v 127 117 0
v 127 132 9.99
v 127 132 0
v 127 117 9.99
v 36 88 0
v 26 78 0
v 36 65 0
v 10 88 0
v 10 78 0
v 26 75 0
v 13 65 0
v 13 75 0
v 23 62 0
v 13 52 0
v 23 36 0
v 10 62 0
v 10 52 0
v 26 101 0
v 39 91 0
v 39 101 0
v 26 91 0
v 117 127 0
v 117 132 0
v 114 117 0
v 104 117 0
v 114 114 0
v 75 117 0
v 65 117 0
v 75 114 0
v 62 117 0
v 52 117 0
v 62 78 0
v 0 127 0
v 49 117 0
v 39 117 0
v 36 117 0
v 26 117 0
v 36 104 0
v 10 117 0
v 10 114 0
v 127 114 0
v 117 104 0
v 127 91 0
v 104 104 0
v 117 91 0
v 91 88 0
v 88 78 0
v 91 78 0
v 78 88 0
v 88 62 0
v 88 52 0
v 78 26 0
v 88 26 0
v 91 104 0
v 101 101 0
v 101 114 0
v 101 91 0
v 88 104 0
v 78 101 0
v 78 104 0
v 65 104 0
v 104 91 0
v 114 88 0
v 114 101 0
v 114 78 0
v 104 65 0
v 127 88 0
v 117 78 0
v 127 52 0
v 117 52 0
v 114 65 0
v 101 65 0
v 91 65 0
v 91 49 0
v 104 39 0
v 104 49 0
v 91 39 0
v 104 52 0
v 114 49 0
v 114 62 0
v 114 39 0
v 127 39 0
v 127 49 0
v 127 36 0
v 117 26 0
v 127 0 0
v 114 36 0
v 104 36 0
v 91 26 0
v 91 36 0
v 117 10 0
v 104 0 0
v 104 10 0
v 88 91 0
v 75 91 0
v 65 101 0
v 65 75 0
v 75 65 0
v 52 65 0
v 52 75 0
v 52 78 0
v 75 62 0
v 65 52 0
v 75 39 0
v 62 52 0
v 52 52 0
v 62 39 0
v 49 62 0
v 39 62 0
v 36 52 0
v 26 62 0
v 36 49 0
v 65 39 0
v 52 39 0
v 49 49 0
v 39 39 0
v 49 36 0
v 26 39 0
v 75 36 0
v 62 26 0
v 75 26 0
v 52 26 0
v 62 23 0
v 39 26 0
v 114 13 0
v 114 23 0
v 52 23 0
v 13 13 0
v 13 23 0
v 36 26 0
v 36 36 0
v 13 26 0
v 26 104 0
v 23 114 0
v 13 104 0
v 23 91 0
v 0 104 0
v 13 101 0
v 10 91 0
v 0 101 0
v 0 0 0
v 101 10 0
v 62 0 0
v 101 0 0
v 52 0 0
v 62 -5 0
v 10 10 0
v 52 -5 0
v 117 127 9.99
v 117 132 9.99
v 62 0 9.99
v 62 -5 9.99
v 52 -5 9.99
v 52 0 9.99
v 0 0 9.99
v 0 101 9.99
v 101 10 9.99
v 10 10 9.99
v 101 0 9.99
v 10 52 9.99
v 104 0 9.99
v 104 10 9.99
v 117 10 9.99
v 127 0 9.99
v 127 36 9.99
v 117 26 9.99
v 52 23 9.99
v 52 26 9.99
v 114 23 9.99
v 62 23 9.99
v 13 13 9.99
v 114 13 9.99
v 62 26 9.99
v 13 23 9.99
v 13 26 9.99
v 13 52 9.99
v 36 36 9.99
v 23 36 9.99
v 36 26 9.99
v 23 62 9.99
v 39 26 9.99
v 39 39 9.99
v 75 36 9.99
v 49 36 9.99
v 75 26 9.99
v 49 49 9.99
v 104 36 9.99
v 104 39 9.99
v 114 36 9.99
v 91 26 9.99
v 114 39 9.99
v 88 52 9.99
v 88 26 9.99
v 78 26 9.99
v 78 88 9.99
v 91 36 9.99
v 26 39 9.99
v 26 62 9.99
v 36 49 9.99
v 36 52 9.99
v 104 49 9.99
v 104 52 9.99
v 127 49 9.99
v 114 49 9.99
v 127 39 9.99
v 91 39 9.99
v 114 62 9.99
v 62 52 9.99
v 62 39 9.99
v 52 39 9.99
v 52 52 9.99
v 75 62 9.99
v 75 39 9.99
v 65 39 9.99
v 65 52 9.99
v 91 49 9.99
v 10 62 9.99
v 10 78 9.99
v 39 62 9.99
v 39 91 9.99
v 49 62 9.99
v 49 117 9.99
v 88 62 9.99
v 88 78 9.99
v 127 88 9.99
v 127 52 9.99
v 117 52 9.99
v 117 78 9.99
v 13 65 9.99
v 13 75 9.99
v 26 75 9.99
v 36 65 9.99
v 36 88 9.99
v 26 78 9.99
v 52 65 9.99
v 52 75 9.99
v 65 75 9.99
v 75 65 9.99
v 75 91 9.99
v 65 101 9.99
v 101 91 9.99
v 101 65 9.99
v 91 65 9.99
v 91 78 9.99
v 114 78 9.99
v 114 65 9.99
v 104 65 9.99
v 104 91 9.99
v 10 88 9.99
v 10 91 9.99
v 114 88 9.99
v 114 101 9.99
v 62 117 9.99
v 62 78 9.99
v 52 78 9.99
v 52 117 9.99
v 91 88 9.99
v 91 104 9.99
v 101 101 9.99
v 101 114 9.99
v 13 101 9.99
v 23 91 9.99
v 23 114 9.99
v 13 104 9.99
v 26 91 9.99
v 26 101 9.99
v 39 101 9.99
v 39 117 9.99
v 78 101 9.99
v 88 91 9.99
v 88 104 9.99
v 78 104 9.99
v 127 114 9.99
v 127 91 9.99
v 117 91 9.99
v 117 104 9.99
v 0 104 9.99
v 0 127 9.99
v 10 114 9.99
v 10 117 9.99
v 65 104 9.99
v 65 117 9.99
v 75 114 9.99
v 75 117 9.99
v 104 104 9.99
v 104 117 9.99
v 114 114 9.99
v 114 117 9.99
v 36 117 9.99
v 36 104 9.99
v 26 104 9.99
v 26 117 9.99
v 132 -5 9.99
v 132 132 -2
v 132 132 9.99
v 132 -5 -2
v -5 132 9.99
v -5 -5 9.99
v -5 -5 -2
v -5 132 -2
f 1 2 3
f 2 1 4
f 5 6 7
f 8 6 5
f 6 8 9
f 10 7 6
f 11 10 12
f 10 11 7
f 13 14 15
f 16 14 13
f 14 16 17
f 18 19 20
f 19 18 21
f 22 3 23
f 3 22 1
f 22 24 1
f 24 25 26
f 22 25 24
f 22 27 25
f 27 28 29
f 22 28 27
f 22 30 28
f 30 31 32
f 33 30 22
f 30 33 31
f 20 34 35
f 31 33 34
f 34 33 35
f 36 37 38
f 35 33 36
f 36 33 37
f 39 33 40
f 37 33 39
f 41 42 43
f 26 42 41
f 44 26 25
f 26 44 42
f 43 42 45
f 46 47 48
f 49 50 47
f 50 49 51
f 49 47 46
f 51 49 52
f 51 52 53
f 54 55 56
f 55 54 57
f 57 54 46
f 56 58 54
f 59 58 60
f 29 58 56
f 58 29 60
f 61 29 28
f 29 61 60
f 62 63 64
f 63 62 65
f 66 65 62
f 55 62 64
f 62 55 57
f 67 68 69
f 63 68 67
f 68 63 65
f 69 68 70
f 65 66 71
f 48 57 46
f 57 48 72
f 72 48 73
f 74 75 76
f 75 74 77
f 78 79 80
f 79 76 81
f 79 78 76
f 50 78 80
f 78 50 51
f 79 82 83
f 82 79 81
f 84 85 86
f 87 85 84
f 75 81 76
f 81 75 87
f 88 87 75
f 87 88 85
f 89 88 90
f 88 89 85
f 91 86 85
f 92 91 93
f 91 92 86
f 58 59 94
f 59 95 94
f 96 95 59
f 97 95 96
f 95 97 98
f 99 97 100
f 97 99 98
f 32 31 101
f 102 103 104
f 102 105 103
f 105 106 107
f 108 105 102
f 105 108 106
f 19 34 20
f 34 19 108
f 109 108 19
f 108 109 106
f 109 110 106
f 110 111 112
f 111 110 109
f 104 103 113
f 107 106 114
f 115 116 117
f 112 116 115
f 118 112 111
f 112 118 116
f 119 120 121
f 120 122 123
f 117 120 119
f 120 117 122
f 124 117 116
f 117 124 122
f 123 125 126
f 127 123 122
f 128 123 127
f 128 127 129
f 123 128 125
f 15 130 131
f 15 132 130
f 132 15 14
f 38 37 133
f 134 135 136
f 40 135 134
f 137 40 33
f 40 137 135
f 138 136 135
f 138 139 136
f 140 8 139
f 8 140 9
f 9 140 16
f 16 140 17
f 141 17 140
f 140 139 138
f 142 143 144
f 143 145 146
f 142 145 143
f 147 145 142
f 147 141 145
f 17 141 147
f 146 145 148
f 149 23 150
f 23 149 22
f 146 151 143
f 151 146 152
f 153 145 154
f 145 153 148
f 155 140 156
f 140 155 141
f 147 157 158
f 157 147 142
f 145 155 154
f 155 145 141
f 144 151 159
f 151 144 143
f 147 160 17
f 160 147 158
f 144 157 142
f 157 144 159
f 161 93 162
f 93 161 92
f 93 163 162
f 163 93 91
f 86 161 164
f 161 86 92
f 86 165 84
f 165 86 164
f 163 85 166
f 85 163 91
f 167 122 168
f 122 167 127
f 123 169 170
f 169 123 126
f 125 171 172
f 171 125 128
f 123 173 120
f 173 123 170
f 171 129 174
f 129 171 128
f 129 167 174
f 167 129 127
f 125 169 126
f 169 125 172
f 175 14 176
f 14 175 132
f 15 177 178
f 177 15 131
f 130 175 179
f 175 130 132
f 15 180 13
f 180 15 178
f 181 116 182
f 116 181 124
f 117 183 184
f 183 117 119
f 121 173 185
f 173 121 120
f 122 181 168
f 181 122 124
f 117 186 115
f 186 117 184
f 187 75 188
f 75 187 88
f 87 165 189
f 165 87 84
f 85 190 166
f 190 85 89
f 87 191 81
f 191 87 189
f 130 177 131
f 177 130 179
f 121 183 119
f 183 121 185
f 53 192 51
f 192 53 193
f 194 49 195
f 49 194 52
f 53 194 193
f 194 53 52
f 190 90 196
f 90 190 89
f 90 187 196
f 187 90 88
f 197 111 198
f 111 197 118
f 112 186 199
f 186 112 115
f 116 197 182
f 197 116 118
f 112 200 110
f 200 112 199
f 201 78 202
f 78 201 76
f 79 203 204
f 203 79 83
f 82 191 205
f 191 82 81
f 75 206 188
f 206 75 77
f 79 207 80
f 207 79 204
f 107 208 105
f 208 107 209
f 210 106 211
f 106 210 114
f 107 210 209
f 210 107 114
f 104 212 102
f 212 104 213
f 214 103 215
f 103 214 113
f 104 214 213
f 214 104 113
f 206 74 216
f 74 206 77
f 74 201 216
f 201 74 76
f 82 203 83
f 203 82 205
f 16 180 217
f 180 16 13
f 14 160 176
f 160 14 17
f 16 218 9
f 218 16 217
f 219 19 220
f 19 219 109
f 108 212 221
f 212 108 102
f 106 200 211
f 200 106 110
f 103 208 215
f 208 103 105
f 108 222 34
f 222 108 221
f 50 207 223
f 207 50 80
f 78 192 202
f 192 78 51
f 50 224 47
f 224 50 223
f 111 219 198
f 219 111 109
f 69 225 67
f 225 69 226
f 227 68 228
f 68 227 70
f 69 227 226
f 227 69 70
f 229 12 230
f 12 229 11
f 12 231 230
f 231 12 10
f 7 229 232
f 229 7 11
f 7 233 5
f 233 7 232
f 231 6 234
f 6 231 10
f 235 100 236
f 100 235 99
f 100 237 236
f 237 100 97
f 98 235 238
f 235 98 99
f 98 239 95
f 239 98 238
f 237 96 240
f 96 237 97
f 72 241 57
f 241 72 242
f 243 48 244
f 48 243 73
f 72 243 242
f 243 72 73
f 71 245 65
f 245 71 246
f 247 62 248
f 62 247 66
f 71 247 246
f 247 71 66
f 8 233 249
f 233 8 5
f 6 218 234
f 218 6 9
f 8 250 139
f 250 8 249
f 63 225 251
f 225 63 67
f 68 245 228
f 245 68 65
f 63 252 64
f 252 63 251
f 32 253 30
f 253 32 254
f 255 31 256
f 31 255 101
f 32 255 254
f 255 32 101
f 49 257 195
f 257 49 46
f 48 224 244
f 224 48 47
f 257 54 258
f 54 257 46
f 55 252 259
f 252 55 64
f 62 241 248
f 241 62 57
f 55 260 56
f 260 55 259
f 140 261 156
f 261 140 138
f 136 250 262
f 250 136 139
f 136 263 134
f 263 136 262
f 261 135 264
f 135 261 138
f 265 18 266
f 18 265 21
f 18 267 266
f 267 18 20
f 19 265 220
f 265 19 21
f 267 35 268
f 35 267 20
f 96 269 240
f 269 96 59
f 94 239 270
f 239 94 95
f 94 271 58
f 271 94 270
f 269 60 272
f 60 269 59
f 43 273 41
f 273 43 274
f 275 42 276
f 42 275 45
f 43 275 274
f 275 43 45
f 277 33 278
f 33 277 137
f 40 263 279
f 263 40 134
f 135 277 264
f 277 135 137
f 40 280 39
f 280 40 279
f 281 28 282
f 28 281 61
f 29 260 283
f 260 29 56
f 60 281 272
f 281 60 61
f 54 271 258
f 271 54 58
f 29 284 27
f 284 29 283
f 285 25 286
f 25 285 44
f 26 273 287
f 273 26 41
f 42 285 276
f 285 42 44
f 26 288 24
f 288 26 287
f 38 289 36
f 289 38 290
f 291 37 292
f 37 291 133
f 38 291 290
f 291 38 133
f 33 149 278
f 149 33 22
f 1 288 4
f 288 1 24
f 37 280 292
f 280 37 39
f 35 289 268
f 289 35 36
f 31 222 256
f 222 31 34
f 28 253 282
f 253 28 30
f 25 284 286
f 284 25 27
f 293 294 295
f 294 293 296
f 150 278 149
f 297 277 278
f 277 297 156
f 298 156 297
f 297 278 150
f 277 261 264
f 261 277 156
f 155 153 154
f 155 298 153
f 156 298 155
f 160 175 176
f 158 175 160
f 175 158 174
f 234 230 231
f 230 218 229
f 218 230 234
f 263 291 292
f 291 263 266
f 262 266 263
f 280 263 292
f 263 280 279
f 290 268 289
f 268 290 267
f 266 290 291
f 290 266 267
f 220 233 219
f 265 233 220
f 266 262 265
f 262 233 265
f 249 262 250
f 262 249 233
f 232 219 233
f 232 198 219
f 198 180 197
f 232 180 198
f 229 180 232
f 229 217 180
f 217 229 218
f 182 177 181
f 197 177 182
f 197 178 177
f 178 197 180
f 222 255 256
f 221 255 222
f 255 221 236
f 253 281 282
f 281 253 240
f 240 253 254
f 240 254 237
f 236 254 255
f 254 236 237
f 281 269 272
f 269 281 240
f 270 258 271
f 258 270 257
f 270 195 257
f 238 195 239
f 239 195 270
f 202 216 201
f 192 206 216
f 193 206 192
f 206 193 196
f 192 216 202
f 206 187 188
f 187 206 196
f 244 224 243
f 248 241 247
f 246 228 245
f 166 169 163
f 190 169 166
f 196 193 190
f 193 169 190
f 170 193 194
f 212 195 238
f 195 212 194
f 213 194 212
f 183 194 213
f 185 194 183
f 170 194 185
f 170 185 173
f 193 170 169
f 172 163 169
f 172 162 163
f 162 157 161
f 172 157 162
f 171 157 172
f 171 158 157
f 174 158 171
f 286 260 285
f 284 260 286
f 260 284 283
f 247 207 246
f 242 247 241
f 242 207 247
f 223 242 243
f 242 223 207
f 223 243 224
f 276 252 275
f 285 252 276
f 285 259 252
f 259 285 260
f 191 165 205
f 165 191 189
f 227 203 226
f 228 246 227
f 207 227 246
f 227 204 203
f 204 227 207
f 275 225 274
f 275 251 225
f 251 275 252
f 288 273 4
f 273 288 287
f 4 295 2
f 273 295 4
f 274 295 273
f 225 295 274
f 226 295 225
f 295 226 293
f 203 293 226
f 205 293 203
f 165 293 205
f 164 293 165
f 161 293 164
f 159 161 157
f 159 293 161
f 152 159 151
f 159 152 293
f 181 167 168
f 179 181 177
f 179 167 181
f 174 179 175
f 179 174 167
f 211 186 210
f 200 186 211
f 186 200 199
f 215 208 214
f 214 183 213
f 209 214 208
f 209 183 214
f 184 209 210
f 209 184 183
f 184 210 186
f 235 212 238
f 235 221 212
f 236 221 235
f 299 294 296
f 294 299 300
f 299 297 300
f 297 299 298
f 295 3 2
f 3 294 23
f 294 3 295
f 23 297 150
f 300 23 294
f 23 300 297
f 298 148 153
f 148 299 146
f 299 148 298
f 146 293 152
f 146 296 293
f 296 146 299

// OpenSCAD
//Algorithms learned from the excellent explanations at http://weblog.jamisbuck.org/2011/2/7/maze-generation-algorithm-recap.html

//preview[view:south, tilt:top]

//See instructions if increasing this doesn't work (this shouldn't be a problem below 25)
maze_width=10;//[4:50]


//See instructions if increasing this doesn't work
maze_height=10;//[4:50]


//See instructions for information on maze types
maze_type = "Sidewinder";//[Sidewinder,Binary Tree,Unicursal Sidewinder,Unicursal Binary Tree]

//Lower numbers cause more vertical paths. Higher numbers cause more horizontal paths.
direction_bias = 5;//[1:9]

//How wide should each path be, in mm
width_of_paths=10;//[1:50]


//Height, in mm, of the walls
wall_height=10;//[5:50]


//Thickness of inside walls, in mm
inside_wall_thickness=3;//[1:10]


//Thickness of outside wall, in mm
outside_wall_thickness=5;//[1:20]

//Allows entry into the maze from the side
include_an_entrance=1;//[0:No,1:Yes]

//Thickness of base below maze, in mm
base_thickness=2;//[1:10]


//See instructions for information on this, otherwise, leave at 0
random_seed = 0;

/* [Hidden] */
bias = (direction_bias < 5)? 5/direction_bias : .2*(10-direction_bias);

seed = (random_seed == 0)?rands(0,1000000,1)[0]:random_seed;
width=unicursalchecker()?(maze_width%2==0)?maze_width/2:(maze_width+1)/2:maze_width;
height=unicursalchecker()?(maze_height%2==0)?maze_height/2:(maze_height+1)/2:maze_height;
path_width=unicursalchecker()?(width_of_paths*2)+inside_wall_thickness:width_of_paths;

    
    difference(){
      mazeBase();//Correctly sized cube
      if(include_an_entrance == 1)  
        mazeEntrance();//More cubes
   if(maze_type == "Sidewinder" || maze_type == "Unicursal Sidewinder")      
        SideWinder();
   if(maze_type == "Binary Tree"||maze_type == "Unicursal Binary Tree")
       BinaryTree();
     }
    if(maze_type == "Unicursal Sidewinder") SideWinder(unicursal = true);//Adds mid-paths for unicursal mazes
    if(maze_type == "Unicursal Binary Tree") BinaryTree(unicursal = true);
function unicursalchecker()=(maze_type == "Unicursal Sidewinder" || maze_type == "Unicursal Binary Tree");
    
module mazeEntrance(){
    
        translate([(path_width*(width-1))+(inside_wall_thickness*(width-1)),(path_width*height)+(inside_wall_thickness*(height-1))-.1,0])cube([path_width,outside_wall_thickness+.2,wall_height+.1]);//Top right entrance
    if(!unicursalchecker()){//Other entrance
        nums = (width%2==0)?(width%4==0)?width/2:(width+2)/2:((width-1)%4==0)?(width+1)/2:(width-1)/2;
        pos=floor(rands(((width-nums)/2),width-((width-nums)/2),1,seed)[0]);
        translate([(path_width*pos)+(inside_wall_thickness*pos),-(outside_wall_thickness+.1),0])cube([path_width,outside_wall_thickness+.2,wall_height+.1]);
    }
}  
    
module mazeBase(){
    
    translate([-outside_wall_thickness,-outside_wall_thickness,-base_thickness])cube([(2*outside_wall_thickness)+(width*path_width)+((width-1)*inside_wall_thickness),(2*outside_wall_thickness)+(height*path_width)+((height-1)*inside_wall_thickness),base_thickness+wall_height-.01]);    
    }
    
module BinaryTree(unicursal=false){
rndtmp=biasfixer(rndtmpgenbias());//generates array of rands

rndflr = rndflrer(rndtmp);//makes array 0 or 1
    
rndrow = rndrower(rndflr);//creates correctly size row
    
mazetopremoved = remove_top_row(rndrow);
//Required for binary tree    
mazeinfo = remove_right_row(mazetopremoved);

    //Generates parts
for(h=[0:height-1])for(w=[0:width-1])
    translate([(path_width+inside_wall_thickness)*w,(path_width+inside_wall_thickness)*h,0])BinaryTreeblock(mazeinfo[h][w]);

function rndtmpgen()= rands(0,2,(width*height),(seed));

function rndtmpgenbias() = rands(0,(1/bias)+1,(width*height),(seed));

function biasfixer(matrix)=[for(i=matrix)(i>1)?1:i];
    
function rndflrer(rndtmp)=[for(i=rndtmp)floor(i)];
    
function rndrower(rndflr)=[for(h=[0:height-1])[for(w=[0:width-1]) rndflr[h * width + w]]];
    
function remove_top_row(mazeinfo)=[for (h=[0:height-1])(h==height-1)?[for (w=[0:width-1])1]:mazeinfo[h]];
    
function remove_right_row(mazeinfo)=[for(h=[0:height-1])[for (w = [0:width-1]) (w==width-1)?(h==height-1)?2:0:mazeinfo[h][w]]];
    
    module BinaryTreeblock(type){
        if(unicursal == false){
        if(type == 0)
            cube([path_width,path_width+inside_wall_thickness+.1,wall_height+.1]);
        if(type == 1)
            cube([path_width+inside_wall_thickness+.1,path_width,wall_height+.1]);
        if(type == 2)
            cube([path_width,path_width,wall_height+.1]);
    }
        if(unicursal == true){//midpaths
            if(type == 1)
                translate([width_of_paths,width_of_paths,0])cube([path_width+inside_wall_thickness,inside_wall_thickness,wall_height+.1]);
            if(type == 0)
                translate([width_of_paths,width_of_paths,0])cube([inside_wall_thickness,path_width+inside_wall_thickness,wall_height + .1]);
            if(type == 2)
                translate([width_of_paths,width_of_paths,0])cube([inside_wall_thickness,width_of_paths+inside_wall_thickness+outside_wall_thickness,wall_height + .1]);
            }
}}
module SideWinder(unicursal=false){
    
rndtmp=biasfixer(rndtmpgenbias());//rnd values

rndflr = rndflrer(rndtmp);//makes values an int[][]
    
rndrow = rndrower(rndflr);//creates rows

rndrowfixed=rndmazefixer(rndrow);//Pre-processing for algorithm

rndsums=rndsummer(rndrowfixed);//How many 0's are in a row

runranded=runrander(rndsums);//Where should it carve up

upcarves = upcarvesgen(runranded);//Puts upcarves where they are needed

mazeinfo_almost = upcarves+rndrowfixed;//combines group and upcarves data
    
mazeinfo=remove_top_row(mazeinfo_almost);//top row must be removed


    
    for(h=[0:height-1])for(w=[0:width-1])
    translate([(path_width+inside_wall_thickness)*w,(path_width+inside_wall_thickness)*h,0])SideWinderblock(mazeinfo[h][w]);//generates blocks

function runrander(rndsums)=[for(h=[0:height-1]) [for(w=[0:width-1])(rndsums[h][w]==0)?0:floor(rands(0,rndsums[h][w],1,rndtmpgen()[h*width + w])[0]+1)]];
    
function remove_top_row(mazeinfo)=[for (h=[0:height-1])(h==height-1)?[for (w=[0:width-1])(w==width-1)?4:0]:mazeinfo[h]];

function upcarvesgen(runranded)=[for(h=[0:height-1])[for(w=[0:width-1])upcarveshelper(runranded[h],w,1)]];
    
function upcarveshelper(runranded,w,iter)=(runranded[w]==0)?upcarveshelper(runranded,w+1,iter+1):(runranded[w] == iter)?2:0;

function rndmazefixer(rndrow)=[for(h=[0:height-1])rndrowfixer(rndrow[h])];
    
function rndrowfixer(row)=[for (w = [0:width-1]) (w==width-1)?1:row[w]];

function rndtmpgen()= rands(0,2,(width*height),(seed));

function rndtmpgenbias() = rands(0,bias+1,(width*height),(seed));

function biasfixer(matrix)=[for(i=matrix)(i>1)?1:i];

function rndflrer(rndtmp)=[for(i=rndtmp)floor(i)];
    
function rndrower(rndflr)=[for(h=[0:height-1])[for(w=[0:width-1]) rndflr[h * width + w]]];
    
function rndsummer(rndrow)=[for(h=rndrow)rndsumrow(h)];
    
function rndsumrow(h,i=0,wi=0)=(i==0)?
        [for (w=[0:len(h)-1]) (h[w]==0)?
            0:
            rndsumrow(h,i=1,wi=w)]:
                (wi == 0)?
                    i:
                    (h[wi-1]==0)?   rndsumrow(h,i=i+1,wi=wi-1):
        i;
        
 module SideWinderblock(type){
            if(unicursal == false){//generate blocks
    if(type == 0){
        cube([path_width+inside_wall_thickness+.1,path_width,wall_height + .1]);       
    }
    if(type == 1||type == 4){
        cube([path_width,path_width,wall_height + .1]);
    }
    if(type == 2){
        SideWinderblock(0);
        SideWinderblock(3);
    }
    if(type == 3){
        
        cube([path_width,path_width+inside_wall_thickness+.1,wall_height + .1]);
    }}
    if(unicursal == true){//generate paths in the middle
        if(type == 0)translate([width_of_paths,width_of_paths,0])cube([path_width+inside_wall_thickness,inside_wall_thickness,wall_height+.1]);
            
        if(type == 1)
            translate([width_of_paths,width_of_paths,0])cube([inside_wall_thickness,inside_wall_thickness,wall_height+.1]);
        
        if(type == 2){
            SideWinderblock(0);
            SideWinderblock(3);
        }
        if(type == 3)
            translate([width_of_paths,width_of_paths,0])cube([inside_wall_thickness,path_width+inside_wall_thickness,wall_height+.1]);
        if(type == 4)
            translate([width_of_paths,width_of_paths,0])cube([inside_wall_thickness,width_of_paths+inside_wall_thickness+outside_wall_thickness,wall_height+.1]);
    }
    
}

}
       
